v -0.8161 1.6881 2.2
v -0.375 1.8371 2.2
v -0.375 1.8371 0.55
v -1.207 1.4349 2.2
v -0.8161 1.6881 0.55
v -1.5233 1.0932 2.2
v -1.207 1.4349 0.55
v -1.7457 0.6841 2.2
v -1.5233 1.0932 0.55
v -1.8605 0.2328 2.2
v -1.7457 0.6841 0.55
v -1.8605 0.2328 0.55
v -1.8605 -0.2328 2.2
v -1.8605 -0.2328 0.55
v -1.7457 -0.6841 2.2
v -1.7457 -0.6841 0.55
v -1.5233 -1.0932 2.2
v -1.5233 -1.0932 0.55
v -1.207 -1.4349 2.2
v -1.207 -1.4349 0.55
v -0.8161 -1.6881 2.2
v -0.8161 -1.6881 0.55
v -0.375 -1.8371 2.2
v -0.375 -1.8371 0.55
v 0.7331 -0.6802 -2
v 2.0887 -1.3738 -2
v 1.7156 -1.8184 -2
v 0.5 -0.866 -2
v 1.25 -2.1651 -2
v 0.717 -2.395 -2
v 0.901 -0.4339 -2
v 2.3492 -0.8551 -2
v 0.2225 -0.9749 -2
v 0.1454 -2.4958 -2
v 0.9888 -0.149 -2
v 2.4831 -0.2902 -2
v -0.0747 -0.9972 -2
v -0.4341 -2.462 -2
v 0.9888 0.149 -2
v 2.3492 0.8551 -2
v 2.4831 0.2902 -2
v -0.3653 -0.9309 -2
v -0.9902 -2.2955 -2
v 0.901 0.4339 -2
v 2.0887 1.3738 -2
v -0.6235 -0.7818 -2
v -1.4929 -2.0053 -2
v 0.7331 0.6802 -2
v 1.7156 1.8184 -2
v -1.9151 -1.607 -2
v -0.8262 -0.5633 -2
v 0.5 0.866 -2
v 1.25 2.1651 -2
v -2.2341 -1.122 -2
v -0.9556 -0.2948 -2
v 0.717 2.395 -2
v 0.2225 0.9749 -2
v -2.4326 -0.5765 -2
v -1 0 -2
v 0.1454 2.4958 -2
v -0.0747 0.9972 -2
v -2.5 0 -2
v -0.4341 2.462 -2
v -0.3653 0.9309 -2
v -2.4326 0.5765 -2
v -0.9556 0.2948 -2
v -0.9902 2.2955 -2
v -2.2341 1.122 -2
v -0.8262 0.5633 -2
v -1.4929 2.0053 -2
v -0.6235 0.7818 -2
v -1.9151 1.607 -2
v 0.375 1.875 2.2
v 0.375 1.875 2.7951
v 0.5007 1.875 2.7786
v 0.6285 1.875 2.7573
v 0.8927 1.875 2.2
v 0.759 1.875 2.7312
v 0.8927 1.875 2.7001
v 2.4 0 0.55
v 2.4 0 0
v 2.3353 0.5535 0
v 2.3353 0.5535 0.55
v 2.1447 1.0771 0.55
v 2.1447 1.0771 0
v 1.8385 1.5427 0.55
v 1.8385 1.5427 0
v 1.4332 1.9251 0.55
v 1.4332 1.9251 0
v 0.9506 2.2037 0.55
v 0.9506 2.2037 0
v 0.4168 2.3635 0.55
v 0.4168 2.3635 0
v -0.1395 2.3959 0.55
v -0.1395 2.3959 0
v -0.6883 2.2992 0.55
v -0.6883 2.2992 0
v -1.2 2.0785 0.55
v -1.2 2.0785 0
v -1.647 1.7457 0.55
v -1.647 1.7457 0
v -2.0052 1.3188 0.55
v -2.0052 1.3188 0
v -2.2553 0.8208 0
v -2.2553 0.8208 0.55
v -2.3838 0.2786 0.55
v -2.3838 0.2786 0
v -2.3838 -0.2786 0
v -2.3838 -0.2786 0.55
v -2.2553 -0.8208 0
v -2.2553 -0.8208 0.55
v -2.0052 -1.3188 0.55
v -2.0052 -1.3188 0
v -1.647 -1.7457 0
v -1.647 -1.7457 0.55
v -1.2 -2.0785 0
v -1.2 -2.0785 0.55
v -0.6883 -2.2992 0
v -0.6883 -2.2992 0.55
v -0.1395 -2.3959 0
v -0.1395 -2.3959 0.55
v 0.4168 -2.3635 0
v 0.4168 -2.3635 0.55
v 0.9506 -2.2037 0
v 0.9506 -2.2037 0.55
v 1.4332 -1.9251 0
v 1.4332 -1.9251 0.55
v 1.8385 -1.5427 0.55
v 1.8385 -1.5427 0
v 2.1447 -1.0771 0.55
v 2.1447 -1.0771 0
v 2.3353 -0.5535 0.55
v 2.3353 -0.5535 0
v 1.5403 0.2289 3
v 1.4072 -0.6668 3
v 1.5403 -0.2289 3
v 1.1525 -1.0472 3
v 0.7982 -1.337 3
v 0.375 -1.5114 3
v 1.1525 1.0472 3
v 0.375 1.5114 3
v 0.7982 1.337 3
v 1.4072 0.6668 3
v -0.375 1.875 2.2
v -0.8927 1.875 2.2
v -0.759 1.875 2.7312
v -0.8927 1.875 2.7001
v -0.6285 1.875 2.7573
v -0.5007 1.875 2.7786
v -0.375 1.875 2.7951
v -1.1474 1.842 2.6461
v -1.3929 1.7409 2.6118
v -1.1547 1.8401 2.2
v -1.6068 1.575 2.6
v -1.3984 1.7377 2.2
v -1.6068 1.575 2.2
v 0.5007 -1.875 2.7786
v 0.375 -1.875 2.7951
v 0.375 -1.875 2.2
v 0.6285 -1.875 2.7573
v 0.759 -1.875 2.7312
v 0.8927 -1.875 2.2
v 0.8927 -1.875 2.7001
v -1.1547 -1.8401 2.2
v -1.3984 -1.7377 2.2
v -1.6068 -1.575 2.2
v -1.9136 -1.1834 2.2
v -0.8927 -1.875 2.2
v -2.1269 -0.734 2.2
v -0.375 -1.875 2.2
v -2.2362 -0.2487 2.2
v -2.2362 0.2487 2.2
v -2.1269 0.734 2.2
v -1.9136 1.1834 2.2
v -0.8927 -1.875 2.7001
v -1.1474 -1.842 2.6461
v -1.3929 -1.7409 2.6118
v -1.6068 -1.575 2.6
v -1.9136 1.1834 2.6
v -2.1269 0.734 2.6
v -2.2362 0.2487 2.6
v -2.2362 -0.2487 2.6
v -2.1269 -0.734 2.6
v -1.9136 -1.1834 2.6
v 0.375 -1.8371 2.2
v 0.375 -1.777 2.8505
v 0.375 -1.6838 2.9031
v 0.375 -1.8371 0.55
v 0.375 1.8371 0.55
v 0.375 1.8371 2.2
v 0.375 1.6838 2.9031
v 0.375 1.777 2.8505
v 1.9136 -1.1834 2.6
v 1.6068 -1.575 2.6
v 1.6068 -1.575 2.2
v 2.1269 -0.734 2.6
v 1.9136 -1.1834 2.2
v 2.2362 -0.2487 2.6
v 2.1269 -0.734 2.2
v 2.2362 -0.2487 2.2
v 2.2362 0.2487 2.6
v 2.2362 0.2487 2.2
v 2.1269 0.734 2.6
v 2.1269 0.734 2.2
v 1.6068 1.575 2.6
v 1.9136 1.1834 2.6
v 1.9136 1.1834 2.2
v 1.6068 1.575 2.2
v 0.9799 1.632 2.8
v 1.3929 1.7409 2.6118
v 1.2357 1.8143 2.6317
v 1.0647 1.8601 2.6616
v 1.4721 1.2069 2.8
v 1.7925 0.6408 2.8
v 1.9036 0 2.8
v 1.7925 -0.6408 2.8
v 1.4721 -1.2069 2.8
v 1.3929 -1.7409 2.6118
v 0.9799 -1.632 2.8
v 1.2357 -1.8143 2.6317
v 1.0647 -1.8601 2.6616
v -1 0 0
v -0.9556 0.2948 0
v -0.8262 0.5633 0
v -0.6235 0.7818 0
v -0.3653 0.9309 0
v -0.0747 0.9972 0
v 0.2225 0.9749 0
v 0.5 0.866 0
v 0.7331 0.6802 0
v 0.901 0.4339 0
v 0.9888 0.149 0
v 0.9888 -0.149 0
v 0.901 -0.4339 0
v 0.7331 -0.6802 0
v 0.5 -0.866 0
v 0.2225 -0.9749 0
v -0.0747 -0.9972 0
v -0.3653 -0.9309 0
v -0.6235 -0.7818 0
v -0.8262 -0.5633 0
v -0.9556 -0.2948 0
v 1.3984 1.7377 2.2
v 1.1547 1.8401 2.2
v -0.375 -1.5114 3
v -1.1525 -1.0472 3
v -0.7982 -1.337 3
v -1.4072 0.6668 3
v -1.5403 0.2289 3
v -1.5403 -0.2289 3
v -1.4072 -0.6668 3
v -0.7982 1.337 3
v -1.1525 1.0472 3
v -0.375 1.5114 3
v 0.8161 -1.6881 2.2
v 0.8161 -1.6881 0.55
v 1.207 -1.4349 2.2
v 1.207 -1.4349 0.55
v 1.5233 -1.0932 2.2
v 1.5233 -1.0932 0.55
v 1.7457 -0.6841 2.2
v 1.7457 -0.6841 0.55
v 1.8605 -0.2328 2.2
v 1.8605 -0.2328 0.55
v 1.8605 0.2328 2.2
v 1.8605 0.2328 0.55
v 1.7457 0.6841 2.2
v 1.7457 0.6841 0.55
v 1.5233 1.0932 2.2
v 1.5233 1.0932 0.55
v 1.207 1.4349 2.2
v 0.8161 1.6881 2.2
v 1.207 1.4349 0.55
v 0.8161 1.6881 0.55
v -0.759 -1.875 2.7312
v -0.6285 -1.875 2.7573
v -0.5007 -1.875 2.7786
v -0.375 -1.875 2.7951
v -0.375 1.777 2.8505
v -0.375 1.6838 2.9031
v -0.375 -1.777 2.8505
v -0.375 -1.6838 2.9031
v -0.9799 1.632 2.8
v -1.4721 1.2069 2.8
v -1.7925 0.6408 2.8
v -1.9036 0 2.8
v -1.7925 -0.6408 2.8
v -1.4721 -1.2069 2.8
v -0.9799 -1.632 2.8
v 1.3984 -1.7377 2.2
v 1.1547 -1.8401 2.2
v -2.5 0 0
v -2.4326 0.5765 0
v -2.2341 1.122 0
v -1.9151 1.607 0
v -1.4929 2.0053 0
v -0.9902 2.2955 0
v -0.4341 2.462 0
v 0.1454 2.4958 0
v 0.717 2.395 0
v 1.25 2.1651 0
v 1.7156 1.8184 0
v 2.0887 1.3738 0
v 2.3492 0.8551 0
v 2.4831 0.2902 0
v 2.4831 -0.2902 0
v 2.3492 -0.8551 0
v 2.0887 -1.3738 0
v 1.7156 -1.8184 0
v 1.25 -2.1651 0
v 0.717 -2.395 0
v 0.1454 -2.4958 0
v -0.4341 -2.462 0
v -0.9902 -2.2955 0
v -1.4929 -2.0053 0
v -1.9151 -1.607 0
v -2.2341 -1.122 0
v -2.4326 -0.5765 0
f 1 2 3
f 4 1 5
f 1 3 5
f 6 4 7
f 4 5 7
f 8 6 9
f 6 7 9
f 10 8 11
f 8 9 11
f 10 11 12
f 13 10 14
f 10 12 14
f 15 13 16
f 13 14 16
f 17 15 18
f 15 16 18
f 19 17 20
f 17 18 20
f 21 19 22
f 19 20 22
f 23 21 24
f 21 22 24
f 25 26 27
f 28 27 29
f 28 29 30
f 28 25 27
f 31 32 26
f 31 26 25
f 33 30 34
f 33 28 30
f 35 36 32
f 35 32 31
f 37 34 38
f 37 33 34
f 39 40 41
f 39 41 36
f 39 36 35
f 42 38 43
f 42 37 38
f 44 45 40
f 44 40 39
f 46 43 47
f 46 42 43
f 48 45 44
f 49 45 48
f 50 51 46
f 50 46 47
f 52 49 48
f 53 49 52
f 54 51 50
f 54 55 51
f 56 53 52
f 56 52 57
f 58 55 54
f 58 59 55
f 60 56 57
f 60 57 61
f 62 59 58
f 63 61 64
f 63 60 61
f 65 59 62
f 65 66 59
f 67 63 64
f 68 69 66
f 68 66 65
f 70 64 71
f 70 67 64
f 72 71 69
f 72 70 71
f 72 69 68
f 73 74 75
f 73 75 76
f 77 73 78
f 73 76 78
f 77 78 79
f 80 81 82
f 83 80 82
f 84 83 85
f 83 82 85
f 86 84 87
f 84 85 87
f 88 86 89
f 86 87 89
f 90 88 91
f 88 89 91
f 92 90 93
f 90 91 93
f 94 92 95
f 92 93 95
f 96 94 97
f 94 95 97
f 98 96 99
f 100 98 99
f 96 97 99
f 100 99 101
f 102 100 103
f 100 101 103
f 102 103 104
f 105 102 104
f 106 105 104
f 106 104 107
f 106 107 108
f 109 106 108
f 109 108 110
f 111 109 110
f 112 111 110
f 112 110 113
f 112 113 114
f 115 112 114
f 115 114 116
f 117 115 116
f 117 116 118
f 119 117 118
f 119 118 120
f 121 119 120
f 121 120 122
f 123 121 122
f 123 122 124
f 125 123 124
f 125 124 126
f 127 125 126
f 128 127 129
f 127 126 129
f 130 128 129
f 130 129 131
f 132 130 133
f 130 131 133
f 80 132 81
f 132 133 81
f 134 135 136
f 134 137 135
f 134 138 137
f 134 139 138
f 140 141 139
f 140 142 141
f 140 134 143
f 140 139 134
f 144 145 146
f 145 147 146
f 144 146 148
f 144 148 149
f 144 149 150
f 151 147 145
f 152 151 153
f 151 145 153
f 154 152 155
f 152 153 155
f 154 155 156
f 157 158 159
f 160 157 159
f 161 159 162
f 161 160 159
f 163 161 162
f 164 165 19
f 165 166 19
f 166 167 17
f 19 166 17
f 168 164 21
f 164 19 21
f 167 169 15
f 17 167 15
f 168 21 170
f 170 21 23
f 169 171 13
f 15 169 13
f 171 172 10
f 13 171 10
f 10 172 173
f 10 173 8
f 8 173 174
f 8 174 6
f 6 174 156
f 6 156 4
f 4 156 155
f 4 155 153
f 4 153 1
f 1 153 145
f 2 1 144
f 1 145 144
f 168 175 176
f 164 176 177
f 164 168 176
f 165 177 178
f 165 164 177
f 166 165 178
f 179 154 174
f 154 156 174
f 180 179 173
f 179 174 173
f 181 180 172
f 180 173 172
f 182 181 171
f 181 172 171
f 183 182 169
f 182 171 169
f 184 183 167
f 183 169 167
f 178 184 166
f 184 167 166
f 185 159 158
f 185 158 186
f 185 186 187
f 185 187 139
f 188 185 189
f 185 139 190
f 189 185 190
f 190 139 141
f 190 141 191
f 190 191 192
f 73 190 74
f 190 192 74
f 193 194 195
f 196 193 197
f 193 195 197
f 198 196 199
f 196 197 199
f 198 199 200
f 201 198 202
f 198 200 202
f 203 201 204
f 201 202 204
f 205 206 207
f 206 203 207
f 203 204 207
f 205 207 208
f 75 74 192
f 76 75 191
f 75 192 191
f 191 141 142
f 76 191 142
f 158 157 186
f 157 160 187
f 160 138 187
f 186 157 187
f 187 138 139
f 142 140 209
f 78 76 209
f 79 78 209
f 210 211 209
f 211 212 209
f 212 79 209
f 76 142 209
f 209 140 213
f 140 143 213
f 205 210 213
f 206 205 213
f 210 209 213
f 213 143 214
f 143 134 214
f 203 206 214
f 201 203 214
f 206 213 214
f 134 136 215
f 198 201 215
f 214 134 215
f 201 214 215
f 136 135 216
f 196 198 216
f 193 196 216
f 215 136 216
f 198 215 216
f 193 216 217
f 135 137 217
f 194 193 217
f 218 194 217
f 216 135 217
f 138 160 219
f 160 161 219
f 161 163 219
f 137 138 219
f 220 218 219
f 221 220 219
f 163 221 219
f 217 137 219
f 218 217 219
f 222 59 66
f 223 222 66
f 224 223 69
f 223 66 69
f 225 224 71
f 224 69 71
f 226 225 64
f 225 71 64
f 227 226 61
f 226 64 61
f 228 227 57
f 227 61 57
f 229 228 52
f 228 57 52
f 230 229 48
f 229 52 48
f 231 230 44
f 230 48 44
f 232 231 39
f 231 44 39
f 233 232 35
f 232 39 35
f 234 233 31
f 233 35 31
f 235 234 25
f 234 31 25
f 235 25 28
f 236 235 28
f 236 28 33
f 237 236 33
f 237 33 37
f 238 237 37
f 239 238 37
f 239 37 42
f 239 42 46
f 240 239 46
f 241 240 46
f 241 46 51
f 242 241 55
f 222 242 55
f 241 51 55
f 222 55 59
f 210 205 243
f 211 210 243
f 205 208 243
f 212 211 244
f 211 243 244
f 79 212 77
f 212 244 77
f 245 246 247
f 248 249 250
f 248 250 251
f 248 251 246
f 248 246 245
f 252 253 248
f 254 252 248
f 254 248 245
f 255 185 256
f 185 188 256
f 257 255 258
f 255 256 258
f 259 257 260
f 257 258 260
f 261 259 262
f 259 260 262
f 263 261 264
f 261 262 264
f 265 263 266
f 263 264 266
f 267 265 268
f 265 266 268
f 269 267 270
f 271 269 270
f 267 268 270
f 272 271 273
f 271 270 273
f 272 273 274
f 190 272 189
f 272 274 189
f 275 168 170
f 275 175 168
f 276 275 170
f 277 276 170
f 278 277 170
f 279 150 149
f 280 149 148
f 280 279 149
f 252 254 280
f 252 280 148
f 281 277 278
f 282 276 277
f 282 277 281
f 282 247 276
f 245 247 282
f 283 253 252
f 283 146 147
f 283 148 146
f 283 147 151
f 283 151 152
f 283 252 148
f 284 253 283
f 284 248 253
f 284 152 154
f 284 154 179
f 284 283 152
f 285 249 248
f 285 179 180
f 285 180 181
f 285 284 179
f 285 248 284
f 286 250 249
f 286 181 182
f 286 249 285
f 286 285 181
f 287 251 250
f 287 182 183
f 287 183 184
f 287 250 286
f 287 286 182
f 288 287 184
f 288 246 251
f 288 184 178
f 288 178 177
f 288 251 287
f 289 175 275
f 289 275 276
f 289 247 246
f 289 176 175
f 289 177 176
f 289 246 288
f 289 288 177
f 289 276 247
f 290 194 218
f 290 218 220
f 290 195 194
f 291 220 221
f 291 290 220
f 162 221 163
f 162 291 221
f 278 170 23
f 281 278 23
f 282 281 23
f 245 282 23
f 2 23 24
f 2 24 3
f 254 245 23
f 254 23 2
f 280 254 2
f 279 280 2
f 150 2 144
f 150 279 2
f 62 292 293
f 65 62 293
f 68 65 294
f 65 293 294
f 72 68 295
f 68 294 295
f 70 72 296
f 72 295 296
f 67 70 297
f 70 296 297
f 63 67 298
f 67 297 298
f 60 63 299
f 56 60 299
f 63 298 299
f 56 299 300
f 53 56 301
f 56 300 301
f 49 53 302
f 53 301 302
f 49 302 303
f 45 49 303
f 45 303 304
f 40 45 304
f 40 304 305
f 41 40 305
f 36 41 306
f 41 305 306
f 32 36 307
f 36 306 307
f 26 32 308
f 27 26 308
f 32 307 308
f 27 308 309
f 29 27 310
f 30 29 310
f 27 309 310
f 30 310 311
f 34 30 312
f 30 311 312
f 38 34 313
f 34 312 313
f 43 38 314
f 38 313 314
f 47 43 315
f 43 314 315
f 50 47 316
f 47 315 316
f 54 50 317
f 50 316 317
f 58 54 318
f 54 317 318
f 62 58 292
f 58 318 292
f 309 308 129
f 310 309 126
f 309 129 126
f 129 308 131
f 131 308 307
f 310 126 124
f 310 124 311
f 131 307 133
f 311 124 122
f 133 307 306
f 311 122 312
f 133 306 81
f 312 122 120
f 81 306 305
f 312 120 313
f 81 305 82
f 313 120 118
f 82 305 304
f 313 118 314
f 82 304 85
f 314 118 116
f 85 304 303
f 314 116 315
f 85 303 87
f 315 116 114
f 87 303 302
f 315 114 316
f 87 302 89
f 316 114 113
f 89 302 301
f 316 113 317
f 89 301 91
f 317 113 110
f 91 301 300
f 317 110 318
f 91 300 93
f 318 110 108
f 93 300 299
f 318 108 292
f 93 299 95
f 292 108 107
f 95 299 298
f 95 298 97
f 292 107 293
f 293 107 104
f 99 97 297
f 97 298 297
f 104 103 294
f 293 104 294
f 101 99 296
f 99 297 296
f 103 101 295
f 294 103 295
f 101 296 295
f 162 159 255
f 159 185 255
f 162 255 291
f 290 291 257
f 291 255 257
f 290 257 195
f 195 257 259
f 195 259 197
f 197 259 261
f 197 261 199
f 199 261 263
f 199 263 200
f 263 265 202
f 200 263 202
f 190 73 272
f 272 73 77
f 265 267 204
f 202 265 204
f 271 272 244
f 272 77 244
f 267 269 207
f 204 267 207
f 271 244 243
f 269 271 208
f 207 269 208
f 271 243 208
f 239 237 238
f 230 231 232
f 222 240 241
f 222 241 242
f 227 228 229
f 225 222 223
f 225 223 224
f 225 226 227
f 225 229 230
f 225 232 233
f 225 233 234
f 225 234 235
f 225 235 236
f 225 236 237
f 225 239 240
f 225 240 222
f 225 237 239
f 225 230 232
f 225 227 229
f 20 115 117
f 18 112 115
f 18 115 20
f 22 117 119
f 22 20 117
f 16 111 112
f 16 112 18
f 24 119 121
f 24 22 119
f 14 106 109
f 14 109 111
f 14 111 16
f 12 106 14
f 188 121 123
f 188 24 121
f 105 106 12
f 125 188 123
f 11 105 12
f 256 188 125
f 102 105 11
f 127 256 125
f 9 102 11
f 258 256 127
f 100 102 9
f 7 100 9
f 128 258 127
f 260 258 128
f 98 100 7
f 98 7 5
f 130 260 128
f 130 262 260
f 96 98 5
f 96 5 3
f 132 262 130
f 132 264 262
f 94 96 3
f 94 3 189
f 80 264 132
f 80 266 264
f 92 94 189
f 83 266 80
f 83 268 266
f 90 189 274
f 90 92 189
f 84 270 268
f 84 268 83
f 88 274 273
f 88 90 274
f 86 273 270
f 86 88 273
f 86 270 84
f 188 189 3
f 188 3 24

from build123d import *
from OCP.BRepFilletAPI import BRepFilletAPI_MakeChamfer

# Parameters (mm, degrees)
SKETCH1_R           = 2.4
BOSS_EXTRUDE1_DEPTH = 0.55
SKETCH2_R           = 1.875
BOSS_EXTRUDE2_DEPTH = 1.65
SKETCH3_R           = 2.5
BOSS_EXTRUDE3_DEPTH = 2
SKETCH4_R           = 2.25
BOSS_EXTRUDE4_DEPTH = 0.8
CUT_EXTRUDE1_REACH  = 8.124
SKETCH5_W           = 0.75
SKETCH5_H           = 6.07376998
CHAMFER1_SIZE       = 0.4
CHAMFER1_SIZE2      = 0.692820323
SKETCH6_W           = 6.999273813
SKETCH6_H           = 5.334981493
SKETCH6_W_2         = 6.558585844
SKETCH6_H_2         = 3.75
CUT_EXTRUDE3_DEPTH  = 2
FILLET2_R           = 1
SKETCH7_R           = 1
CUT_EXTRUDE4_DEPTH  = 2


with BuildPart() as part:
    # Sketch1 → Boss-Extrude1 (new body)
    with BuildSketch(Plane.XY):
        Circle(SKETCH1_R)
    extrude(amount=BOSS_EXTRUDE1_DEPTH)

    # Sketch2 → Boss-Extrude2 (add)
    with BuildSketch(Plane.XY.offset(0.55)):
        Circle(SKETCH2_R)
    extrude(amount=BOSS_EXTRUDE2_DEPTH)

    # Sketch3 → Boss-Extrude3 (add)
    with BuildSketch(Plane(origin=(0, 0, 0), x_dir=(-1, 0, 0), z_dir=(0, 0, -1))):
        Circle(SKETCH3_R)
    extrude(amount=BOSS_EXTRUDE3_DEPTH)

    # Sketch4 → Boss-Extrude4 (add)
    with BuildSketch(Plane.XY.offset(2.2)):
        Circle(SKETCH4_R)
    extrude(amount=BOSS_EXTRUDE4_DEPTH)

    # Cut-Extrude1: up to this face of the body (flat: up to its plane)
    cut_extrude1_end = Plane(part.part.faces().sort_by_distance((-2.332117749, 0, 0.55))[0])
    # Sketch5 → Cut-Extrude1 (cut, up to the picked face)
    with BuildSketch(Plane.XY.offset(3), mode=Mode.PRIVATE) as cut_extrude1_sk1:
        Rectangle(SKETCH5_W, SKETCH5_H)
    cut_extrude1_tool1 = split(extrude(cut_extrude1_sk1.sketch, amount=-CUT_EXTRUDE1_REACH, mode=Mode.PRIVATE), bisect_by=cut_extrude1_end, keep=Keep.BOTH, mode=Mode.PRIVATE)
    add(cut_extrude1_tool1.solids().sort_by(Axis((0, 0, 3), (0, 0, -1)))[0], mode=Mode.SUBTRACT)

    # Chamfer1: one chamfer whose edges measure the first distance from different faces: ONE call of the kernel's chamfer builder (chamfer() names one face for all edges)
    chamfer1_edges_1 = [part.edges().sort_by_distance(p)[0] for p in [
        (-2.25, 0, 3),
    ]]
    chamfer1_side_1 = [part.faces().sort_by_distance(p)[0] for p in [
        (-2.25, 0, 2.6),
    ]]
    chamfer1_edges_2 = [part.edges().sort_by_distance(p)[0] for p in [
        (2.25, 0, 3),
    ]]
    chamfer1_side_2 = [part.faces().sort_by_distance(p)[0] for p in [
        (2.25, 0, 2.6),
    ]]
    chamfer1 = BRepFilletAPI_MakeChamfer(part.part.solid().wrapped)
    for e in chamfer1_edges_1:
        chamfer1.Add(CHAMFER1_SIZE, CHAMFER1_SIZE2, e.wrapped, chamfer1_side_1[0].wrapped)  # the first distance lies on this face
    for e in chamfer1_edges_2:
        chamfer1.Add(CHAMFER1_SIZE, CHAMFER1_SIZE2, e.wrapped, chamfer1_side_2[0].wrapped)  # the first distance lies on this face
    add(Compound.cast(chamfer1.Shape()), mode=Mode.REPLACE)

    # Sketch6 → Cut-Extrude3 (cut)
    with BuildSketch(Plane.XY.offset(3)):
        with Locations((0.047792, -0.043471688)):
            Rectangle(SKETCH6_W, SKETCH6_H)
        Rectangle(SKETCH6_W_2, SKETCH6_H_2, mode=Mode.SUBTRACT)
    extrude(amount=-CUT_EXTRUDE3_DEPTH, mode=Mode.SUBTRACT)

    # Fillet2
    fillet2_edges = [part.edges().sort_by_distance(p)[0] for p in [
        (-1.243734296, 1.875, 2.4),
        (1.243734296, 1.875, 2.4),
        (-1.243734296, -1.875, 2.4),
        (1.243734296, -1.875, 2.4),
    ]]
    fillet(fillet2_edges, radius=FILLET2_R)

    # Sketch7 → Cut-Extrude4 (cut)
    with BuildSketch(Plane(origin=(0, 0, -2), x_dir=(-1, 0, 0), z_dir=(0, 0, -1))):
        Circle(SKETCH7_R)
    extrude(amount=-CUT_EXTRUDE4_DEPTH, mode=Mode.SUBTRACT)


solid = part.part
